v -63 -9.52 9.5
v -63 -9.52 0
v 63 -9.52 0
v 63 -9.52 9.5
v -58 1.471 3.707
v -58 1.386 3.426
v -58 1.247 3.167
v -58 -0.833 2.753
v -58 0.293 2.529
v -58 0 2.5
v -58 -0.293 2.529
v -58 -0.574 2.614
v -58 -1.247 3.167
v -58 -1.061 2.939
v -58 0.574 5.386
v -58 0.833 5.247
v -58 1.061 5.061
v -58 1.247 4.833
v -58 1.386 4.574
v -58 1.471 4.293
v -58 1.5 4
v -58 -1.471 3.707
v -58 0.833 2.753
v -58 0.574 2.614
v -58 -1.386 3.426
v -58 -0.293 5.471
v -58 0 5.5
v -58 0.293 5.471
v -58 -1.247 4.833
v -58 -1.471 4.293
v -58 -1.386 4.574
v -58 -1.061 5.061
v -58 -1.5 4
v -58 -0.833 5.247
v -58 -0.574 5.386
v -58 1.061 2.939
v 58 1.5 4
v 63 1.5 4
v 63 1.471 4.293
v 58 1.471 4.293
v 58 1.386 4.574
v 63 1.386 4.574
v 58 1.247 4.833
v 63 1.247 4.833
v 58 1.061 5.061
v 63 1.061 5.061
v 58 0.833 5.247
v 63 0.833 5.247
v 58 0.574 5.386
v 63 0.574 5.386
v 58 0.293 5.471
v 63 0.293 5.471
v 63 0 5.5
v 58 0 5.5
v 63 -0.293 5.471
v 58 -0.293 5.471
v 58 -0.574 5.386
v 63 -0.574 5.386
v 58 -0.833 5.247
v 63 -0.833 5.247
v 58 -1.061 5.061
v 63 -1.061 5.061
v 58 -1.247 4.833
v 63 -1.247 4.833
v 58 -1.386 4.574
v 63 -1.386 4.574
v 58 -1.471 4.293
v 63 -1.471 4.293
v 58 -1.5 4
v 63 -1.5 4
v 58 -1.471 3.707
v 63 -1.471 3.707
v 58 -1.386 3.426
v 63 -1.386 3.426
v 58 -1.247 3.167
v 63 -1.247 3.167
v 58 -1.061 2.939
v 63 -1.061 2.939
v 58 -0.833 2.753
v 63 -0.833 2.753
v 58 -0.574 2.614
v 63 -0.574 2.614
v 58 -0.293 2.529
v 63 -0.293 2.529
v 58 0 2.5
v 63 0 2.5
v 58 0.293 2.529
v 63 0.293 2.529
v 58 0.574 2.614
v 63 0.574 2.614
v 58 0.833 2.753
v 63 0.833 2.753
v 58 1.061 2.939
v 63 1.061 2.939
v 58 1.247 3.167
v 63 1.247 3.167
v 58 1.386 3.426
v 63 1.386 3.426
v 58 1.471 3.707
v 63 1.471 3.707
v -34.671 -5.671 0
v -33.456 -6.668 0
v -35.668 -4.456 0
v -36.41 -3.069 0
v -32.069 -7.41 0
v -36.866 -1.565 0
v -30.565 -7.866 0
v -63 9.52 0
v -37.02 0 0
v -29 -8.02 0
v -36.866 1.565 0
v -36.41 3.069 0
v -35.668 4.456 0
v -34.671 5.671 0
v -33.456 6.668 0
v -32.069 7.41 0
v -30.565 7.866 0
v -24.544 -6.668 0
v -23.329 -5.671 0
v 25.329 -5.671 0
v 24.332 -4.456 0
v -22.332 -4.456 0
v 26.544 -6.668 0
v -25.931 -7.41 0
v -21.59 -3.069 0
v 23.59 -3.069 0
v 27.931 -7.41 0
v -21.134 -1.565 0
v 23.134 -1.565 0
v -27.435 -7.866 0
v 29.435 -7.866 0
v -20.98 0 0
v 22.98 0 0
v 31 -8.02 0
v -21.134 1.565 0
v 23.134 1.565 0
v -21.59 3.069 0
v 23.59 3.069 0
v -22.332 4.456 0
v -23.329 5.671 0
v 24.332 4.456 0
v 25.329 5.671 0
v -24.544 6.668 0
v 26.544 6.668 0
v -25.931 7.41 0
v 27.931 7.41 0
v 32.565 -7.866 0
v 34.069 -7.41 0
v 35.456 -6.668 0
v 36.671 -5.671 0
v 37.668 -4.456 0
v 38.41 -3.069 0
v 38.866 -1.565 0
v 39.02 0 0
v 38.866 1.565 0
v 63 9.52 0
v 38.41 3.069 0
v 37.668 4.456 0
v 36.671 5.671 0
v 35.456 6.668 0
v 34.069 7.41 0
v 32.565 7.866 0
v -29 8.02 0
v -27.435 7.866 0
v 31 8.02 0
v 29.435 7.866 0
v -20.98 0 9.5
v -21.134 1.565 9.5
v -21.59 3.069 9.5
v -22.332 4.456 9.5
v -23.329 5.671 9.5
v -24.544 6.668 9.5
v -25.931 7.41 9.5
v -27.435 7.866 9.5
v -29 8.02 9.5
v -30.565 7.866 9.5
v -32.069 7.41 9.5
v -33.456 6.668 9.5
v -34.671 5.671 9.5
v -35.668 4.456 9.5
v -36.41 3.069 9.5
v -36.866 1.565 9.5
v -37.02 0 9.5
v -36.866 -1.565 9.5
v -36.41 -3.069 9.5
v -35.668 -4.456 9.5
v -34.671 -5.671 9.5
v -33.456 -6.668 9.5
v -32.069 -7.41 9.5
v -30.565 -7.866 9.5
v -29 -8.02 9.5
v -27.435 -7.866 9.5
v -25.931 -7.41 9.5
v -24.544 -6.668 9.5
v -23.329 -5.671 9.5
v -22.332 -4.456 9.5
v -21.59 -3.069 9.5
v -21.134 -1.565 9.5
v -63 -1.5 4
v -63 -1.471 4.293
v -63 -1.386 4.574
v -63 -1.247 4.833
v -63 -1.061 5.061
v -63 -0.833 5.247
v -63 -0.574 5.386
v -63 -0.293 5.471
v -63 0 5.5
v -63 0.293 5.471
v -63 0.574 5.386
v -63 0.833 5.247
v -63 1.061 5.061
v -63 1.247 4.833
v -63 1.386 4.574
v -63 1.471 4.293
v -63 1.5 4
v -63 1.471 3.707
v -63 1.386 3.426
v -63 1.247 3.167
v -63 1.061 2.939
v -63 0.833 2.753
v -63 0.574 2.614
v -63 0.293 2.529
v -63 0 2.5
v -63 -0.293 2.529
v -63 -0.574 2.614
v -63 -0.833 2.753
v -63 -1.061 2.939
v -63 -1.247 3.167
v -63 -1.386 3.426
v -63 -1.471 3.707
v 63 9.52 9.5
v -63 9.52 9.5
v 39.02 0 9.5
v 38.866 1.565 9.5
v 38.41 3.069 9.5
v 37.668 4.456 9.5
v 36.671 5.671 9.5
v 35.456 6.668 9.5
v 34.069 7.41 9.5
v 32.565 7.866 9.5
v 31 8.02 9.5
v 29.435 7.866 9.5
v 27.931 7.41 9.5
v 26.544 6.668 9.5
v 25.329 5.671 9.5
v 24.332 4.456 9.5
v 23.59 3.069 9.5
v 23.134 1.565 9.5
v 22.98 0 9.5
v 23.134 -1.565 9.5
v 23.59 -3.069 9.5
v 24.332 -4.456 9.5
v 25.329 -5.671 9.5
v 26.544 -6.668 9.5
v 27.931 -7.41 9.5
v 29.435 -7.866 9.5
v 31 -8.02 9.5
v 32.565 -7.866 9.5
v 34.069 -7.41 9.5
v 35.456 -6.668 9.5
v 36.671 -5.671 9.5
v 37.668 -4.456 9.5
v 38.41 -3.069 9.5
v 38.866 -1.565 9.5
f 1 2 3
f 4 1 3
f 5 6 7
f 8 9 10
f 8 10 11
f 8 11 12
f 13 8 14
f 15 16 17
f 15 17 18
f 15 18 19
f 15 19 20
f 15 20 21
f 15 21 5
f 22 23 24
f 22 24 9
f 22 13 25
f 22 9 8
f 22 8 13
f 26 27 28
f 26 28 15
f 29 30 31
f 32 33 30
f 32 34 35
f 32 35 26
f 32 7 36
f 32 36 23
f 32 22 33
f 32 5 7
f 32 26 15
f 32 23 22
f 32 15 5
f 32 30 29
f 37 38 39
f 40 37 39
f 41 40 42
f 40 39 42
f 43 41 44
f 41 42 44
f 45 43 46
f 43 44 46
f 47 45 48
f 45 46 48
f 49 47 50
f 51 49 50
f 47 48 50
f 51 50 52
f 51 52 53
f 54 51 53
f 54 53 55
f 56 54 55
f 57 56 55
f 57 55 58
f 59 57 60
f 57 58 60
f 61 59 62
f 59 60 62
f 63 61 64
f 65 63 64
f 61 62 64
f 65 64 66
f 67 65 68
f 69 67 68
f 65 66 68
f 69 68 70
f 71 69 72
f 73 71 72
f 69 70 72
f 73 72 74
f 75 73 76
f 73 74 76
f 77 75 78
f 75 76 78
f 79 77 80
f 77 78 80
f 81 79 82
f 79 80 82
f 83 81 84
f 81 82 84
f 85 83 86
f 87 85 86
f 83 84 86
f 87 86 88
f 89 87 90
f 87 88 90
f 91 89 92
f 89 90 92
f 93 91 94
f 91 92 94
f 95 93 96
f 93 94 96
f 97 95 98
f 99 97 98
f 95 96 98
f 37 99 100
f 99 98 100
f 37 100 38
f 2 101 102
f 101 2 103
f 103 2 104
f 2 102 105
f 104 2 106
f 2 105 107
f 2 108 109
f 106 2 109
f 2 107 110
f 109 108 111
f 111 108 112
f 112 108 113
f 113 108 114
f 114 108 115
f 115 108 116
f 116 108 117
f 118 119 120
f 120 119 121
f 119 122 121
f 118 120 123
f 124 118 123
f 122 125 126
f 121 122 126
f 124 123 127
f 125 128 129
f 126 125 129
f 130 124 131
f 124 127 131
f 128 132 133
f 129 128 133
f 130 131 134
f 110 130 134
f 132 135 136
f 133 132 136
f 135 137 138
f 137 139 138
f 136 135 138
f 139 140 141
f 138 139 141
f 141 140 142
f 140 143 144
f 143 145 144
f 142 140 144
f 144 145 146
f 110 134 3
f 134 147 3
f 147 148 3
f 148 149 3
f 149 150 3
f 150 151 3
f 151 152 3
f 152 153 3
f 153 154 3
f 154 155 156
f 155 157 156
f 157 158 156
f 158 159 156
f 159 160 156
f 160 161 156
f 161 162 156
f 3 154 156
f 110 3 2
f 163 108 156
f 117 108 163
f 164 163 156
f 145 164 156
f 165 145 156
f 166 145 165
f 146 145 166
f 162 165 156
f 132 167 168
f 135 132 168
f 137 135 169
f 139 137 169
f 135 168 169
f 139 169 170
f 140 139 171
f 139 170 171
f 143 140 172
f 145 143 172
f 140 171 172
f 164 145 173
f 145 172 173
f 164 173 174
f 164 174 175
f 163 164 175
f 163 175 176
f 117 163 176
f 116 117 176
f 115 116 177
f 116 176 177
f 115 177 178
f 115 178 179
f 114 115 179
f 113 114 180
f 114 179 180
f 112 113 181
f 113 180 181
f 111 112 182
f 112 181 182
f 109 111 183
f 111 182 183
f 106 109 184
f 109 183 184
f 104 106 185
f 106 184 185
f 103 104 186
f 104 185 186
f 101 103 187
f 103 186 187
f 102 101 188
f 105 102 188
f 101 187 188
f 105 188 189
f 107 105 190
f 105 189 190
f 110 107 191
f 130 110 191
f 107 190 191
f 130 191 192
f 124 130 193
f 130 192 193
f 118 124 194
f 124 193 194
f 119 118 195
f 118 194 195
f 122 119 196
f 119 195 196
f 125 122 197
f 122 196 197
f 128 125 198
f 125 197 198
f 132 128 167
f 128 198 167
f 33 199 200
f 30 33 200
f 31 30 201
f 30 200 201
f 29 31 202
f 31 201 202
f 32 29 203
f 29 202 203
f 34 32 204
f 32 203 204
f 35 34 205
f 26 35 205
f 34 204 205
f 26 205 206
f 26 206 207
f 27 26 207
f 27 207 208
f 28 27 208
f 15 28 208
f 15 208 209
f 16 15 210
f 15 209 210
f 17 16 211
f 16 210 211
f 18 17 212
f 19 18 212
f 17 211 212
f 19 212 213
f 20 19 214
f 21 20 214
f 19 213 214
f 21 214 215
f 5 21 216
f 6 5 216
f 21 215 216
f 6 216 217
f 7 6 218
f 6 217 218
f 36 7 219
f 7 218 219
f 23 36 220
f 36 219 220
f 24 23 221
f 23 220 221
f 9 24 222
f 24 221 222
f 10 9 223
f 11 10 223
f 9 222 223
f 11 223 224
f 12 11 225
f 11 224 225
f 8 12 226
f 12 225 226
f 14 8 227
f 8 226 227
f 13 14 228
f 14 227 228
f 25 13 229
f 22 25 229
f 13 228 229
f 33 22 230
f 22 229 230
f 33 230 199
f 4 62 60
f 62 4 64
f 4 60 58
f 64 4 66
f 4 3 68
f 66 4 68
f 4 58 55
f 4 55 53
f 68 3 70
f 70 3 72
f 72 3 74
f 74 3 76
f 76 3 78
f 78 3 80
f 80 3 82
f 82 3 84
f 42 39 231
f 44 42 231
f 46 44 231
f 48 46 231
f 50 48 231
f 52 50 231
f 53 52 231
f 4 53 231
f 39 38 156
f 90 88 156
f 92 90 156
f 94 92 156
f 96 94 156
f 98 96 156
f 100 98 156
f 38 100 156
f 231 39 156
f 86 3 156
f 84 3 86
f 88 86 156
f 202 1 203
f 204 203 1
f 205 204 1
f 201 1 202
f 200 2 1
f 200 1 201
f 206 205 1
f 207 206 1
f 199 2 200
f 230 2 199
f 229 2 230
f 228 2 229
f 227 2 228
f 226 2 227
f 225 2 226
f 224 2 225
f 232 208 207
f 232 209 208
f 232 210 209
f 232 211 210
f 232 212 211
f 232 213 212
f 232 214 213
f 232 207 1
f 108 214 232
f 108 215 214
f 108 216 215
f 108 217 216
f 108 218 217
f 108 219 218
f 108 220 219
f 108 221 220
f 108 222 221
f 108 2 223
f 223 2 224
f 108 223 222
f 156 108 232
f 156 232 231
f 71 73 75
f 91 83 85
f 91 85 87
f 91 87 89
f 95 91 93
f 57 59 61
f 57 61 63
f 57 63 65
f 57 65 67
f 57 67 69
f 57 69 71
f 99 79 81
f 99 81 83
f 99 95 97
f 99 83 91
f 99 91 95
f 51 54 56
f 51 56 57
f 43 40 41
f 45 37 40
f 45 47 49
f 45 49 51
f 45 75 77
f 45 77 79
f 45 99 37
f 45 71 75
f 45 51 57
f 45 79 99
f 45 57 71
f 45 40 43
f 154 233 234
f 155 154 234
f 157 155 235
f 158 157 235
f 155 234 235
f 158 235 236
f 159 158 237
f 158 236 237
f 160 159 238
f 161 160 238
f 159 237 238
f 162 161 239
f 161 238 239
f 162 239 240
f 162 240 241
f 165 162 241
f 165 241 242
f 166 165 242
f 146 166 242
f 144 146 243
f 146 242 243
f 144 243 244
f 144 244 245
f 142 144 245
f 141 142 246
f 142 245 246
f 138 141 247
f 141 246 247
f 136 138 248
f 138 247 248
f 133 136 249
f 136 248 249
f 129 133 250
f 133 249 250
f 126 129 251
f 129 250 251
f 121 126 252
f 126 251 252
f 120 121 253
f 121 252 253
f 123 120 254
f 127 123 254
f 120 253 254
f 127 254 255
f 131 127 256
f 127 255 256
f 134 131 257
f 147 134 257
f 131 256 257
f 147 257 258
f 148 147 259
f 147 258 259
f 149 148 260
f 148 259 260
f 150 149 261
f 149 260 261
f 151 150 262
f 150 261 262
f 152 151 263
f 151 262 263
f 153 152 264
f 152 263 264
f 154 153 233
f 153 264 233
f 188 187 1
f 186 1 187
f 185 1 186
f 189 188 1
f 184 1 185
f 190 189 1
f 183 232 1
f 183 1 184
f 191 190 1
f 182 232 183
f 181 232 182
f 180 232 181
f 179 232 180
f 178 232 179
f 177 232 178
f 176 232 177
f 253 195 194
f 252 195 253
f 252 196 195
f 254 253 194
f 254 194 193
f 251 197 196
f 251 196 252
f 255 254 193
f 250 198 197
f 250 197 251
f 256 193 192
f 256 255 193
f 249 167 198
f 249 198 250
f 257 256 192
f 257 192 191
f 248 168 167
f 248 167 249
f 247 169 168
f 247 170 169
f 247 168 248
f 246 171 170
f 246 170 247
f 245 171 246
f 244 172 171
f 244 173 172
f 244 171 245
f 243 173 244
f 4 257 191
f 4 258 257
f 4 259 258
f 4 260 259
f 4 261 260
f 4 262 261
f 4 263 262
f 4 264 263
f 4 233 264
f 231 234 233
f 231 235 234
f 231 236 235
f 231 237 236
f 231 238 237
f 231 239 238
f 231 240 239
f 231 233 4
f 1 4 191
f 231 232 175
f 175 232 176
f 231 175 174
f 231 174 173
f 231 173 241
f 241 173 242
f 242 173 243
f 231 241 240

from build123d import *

# Parameters (mm, degrees)
F0_W     = 126
F0_H     = 19.04
F1_DEPTH = 9.5
F2_R     = 1.5
F3_DEPTH = 5
F4_R     = 1.5
F5_DEPTH = 5
F6_R     = 8.02
F7_DEPTH = 9.5


with BuildPart() as f1:
    # F0 (on Top) → F1 (new body)
    with BuildSketch(Plane.XY):
        Rectangle(F0_W, F0_H)
    extrude(amount=F1_DEPTH)

    # F2 (on face) → F3 (cut)
    with BuildSketch(Plane(origin=(-63, 0, 0), x_dir=(0, -1, 0), z_dir=(-1, 0, 0))):
        with Locations((0, 4)):
            Circle(F2_R)
    extrude(amount=-F3_DEPTH, mode=Mode.SUBTRACT)

    # F4 (on face) → F5 (cut)
    with BuildSketch(Plane.YZ.offset(63)):
        with Locations((0, 4)):
            Circle(F4_R)
    extrude(amount=-F5_DEPTH, mode=Mode.SUBTRACT)

    # F6 (on face) → F7 (cut)
    with BuildSketch(Plane.XY.offset(9.5)):
        with Locations((-29, 0)):
            Circle(F6_R)
        with Locations((31, 0)):
            Circle(F6_R)
    extrude(amount=-F7_DEPTH, mode=Mode.SUBTRACT)


solid = f1.part
